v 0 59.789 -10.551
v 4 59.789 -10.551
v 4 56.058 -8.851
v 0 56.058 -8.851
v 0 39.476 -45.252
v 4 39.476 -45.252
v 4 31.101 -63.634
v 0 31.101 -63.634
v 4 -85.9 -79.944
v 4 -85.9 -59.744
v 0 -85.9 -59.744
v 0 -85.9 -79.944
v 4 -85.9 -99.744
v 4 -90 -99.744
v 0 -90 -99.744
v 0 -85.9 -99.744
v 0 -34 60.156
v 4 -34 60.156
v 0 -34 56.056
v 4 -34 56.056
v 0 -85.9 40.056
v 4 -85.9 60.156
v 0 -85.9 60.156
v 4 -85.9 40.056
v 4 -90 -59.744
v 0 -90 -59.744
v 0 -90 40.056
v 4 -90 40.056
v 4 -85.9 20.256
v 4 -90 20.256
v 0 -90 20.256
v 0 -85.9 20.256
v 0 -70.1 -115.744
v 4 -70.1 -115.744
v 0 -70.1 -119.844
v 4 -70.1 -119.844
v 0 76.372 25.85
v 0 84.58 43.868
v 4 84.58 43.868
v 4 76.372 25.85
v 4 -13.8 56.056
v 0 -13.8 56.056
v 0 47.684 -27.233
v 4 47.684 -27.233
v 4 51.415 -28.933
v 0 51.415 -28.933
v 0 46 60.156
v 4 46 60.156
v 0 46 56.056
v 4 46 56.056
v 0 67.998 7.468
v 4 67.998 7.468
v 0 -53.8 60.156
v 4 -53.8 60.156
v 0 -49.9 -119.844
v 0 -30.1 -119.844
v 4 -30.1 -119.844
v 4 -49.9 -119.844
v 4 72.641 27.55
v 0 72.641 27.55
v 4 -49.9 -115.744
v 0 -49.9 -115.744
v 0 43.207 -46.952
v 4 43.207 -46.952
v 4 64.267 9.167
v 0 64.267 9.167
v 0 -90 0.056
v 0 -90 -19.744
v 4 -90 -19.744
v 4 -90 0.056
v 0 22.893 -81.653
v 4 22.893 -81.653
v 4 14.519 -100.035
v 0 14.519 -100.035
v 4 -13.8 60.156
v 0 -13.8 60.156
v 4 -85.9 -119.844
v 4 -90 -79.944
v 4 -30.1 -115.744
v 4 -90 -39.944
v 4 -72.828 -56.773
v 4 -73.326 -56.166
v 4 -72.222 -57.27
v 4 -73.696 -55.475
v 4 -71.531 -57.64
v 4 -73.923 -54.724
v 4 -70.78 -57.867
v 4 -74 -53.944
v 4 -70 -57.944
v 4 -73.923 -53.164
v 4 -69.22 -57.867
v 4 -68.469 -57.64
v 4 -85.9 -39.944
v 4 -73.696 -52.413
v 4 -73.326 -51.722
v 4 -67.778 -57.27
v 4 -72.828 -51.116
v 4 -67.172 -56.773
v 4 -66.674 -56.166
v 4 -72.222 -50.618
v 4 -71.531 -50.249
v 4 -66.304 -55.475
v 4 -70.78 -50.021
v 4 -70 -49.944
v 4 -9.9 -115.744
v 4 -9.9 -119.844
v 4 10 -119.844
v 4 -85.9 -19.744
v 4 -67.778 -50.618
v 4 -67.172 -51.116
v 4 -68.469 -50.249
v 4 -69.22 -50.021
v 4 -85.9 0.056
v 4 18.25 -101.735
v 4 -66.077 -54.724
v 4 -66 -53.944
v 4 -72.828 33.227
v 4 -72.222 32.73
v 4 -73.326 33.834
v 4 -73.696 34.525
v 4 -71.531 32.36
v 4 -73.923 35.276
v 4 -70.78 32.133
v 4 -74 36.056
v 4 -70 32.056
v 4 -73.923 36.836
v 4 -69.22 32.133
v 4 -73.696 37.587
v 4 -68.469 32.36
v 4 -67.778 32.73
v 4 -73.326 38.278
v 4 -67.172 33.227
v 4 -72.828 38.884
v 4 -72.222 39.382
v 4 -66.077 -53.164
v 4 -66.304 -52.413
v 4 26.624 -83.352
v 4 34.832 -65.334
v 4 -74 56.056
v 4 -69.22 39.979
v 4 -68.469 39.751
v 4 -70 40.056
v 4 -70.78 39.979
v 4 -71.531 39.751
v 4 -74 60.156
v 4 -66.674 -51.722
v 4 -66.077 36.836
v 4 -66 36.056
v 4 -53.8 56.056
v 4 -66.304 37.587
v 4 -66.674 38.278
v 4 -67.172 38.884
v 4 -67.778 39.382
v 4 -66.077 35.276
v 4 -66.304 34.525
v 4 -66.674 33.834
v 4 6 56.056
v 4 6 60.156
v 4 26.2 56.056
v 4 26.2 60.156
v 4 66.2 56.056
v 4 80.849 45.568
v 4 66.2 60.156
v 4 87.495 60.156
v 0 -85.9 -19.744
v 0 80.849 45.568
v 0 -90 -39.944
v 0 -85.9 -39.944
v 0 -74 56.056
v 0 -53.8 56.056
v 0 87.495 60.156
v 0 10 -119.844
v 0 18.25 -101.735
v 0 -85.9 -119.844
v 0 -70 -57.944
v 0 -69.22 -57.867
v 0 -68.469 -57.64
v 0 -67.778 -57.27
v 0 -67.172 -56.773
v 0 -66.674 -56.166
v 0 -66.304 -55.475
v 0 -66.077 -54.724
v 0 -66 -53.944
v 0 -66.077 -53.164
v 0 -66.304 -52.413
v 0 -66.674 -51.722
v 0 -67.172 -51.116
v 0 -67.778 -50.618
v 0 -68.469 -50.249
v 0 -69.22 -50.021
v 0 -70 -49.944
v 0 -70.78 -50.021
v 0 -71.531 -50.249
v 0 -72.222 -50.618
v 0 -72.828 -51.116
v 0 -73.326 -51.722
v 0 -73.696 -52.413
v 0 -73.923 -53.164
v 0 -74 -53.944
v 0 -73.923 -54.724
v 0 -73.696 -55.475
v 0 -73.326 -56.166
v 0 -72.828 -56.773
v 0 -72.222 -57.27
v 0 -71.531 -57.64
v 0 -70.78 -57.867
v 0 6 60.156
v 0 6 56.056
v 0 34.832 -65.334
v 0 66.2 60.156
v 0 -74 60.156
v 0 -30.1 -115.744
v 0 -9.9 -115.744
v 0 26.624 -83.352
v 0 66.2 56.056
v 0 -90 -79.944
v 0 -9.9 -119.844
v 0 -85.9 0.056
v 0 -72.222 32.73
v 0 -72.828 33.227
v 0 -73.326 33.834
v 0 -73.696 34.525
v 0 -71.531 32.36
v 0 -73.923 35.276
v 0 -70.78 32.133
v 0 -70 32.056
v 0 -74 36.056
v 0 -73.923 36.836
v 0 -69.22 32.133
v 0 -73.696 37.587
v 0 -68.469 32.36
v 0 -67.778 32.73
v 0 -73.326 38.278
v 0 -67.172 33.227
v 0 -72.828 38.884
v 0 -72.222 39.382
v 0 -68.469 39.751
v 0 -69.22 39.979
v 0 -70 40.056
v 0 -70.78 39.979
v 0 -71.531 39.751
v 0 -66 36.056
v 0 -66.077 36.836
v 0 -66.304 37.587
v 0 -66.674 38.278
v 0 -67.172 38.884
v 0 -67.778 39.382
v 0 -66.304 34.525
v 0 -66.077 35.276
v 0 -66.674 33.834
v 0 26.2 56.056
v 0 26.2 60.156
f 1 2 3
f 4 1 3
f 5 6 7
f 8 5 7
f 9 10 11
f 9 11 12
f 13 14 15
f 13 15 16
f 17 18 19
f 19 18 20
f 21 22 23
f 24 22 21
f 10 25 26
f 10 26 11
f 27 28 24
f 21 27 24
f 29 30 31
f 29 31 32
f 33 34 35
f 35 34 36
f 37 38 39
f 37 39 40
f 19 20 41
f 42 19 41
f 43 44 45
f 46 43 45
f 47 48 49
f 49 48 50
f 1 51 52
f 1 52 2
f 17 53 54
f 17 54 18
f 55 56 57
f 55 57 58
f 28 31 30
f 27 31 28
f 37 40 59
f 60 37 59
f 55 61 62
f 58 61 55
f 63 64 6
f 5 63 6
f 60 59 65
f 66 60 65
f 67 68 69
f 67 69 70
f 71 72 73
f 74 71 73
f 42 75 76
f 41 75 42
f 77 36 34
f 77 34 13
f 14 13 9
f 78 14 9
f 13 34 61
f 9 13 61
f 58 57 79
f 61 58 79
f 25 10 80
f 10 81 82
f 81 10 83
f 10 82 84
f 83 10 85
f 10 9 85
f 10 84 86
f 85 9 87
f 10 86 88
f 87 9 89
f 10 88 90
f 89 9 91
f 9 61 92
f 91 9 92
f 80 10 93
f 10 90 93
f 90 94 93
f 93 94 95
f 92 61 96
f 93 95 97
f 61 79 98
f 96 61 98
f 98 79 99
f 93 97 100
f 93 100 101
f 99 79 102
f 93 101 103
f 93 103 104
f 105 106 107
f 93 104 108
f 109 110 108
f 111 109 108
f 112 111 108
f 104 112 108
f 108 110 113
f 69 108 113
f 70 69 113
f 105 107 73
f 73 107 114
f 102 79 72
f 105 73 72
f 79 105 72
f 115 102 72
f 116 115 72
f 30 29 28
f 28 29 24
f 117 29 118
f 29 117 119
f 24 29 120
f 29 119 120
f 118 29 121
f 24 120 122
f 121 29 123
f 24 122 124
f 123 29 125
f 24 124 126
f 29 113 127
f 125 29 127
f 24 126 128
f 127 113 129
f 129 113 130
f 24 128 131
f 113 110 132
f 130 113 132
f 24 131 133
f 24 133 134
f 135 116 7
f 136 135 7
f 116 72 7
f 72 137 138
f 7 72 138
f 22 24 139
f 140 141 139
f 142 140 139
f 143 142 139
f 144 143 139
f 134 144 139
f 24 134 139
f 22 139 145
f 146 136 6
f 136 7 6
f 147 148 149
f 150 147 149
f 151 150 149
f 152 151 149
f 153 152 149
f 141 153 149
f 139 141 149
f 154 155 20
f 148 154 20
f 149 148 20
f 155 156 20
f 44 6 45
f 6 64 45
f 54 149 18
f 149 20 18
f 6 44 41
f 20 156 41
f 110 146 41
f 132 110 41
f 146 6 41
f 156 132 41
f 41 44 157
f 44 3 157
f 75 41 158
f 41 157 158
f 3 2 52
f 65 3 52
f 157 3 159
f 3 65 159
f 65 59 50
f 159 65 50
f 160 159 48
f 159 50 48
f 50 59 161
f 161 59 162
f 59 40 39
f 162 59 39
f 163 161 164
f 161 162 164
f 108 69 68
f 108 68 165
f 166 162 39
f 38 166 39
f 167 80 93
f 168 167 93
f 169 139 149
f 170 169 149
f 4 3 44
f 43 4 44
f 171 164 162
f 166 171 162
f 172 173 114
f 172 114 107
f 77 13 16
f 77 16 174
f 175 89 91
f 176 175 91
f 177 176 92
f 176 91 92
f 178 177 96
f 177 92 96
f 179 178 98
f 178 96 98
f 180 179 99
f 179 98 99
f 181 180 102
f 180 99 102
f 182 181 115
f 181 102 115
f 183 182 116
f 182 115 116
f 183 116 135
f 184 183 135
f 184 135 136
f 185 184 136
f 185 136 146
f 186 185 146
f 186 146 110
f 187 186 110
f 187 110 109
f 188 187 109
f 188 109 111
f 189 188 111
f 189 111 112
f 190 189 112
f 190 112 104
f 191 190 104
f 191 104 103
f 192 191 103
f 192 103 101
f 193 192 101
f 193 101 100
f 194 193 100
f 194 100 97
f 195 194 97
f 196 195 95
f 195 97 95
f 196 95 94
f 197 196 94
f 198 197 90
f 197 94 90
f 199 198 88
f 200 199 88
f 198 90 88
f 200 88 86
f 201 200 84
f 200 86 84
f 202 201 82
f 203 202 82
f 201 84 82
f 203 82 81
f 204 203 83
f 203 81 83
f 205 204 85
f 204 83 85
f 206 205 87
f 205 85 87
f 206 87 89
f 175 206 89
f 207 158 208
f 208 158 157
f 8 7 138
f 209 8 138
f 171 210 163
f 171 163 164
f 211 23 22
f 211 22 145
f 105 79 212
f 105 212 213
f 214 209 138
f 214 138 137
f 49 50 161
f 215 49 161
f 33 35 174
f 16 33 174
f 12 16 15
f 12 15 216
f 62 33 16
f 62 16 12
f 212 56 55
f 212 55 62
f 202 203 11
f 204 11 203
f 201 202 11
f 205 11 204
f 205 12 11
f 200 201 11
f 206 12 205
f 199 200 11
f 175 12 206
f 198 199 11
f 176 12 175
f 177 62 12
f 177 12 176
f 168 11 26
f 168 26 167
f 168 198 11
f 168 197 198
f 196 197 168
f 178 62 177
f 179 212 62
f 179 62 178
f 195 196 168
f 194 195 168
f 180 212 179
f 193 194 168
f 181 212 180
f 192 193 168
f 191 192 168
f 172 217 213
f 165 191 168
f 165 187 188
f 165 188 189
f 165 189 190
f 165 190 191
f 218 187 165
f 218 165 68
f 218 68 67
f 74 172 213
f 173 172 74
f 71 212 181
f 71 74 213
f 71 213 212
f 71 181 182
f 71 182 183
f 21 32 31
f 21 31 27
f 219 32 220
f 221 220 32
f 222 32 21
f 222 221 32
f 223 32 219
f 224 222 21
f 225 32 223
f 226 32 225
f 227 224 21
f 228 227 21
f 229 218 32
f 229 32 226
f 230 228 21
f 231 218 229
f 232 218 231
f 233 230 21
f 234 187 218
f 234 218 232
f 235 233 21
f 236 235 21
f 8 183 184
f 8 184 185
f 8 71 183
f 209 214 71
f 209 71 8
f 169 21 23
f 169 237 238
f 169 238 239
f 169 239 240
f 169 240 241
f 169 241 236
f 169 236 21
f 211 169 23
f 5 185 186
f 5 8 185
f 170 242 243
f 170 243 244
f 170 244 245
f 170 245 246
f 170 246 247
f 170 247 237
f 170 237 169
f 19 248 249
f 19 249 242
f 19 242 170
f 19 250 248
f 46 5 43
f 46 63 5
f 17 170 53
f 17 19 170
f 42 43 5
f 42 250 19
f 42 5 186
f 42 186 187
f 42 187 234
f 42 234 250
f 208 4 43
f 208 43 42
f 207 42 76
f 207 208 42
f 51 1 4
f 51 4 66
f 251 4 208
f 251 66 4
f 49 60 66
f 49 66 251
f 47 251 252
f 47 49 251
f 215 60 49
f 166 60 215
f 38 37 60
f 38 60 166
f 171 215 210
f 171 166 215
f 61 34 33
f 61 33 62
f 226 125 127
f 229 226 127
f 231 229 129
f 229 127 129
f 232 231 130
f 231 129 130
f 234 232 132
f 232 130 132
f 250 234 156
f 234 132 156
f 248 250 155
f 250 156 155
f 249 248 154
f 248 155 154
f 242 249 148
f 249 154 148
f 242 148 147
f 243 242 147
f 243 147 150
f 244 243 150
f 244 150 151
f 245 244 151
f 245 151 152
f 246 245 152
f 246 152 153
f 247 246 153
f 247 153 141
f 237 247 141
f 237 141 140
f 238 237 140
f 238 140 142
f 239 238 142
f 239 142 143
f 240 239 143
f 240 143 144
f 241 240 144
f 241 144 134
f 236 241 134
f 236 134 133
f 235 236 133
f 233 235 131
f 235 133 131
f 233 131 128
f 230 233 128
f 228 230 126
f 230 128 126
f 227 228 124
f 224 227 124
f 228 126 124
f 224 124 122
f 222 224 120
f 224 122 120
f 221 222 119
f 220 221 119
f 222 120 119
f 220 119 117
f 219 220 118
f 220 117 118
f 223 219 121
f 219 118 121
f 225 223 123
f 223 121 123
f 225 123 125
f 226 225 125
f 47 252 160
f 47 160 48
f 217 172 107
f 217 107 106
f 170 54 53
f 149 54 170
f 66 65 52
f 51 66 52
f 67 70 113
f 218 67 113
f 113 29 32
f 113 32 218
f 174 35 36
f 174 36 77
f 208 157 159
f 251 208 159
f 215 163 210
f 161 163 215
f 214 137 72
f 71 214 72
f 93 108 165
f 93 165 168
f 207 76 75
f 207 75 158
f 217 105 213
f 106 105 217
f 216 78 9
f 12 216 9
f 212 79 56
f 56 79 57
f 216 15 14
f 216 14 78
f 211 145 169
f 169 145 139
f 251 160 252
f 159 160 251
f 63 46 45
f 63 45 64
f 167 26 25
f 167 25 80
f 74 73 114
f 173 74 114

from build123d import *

# Parameters (mm, degrees)
BOSS_EXTRUDE1_DEPTH = 4
SKETCH2_W           = 20.2
SKETCH2_H           = 4.1
CUT_EXTRUDE1_DEPTH  = 5
LPATTERN1_COUNT     = 6
LPATTERN1_PITCH     = 40
SKETCH3_W           = 4.1
SKETCH3_H           = 20.2
CUT_EXTRUDE2_DEPTH  = 4
LPATTERN2_COUNT     = 4
LPATTERN2_PITCH     = 40
SKETCH4_W           = 4.1
SKETCH4_H           = 20.2
CUT_EXTRUDE3_DEPTH  = 4
LPATTERN3_COUNT     = 2
LPATTERN3_PITCH     = 40
CUT_EXTRUDE4_DEPTH  = 4
LPATTERN4_COUNT     = 6
LPATTERN4_PITCH     = 40
SKETCH6_R           = 4
CUT_EXTRUDE5_DEPTH  = 5


with BuildPart() as part:
    # Sketch1 → Boss-Extrude1 (new body)
    with BuildSketch(Plane(origin=(0, 0, 0), x_dir=(0, 0, -1), z_dir=(1, 0, 0))):
        Polygon((-60.155879739, 92), (119.844120261, 10), (119.844120261, -90), (-60.155879739, -90), align=None)
    extrude(amount=BOSS_EXTRUDE1_DEPTH)

    # Sketch2 → Cut-Extrude1 (cut, through all)
    with BuildSketch(Plane(origin=(4, 0, 0), x_dir=(0, 0, -1), z_dir=(1, 0, 0))):
        with Locations((-50.155879739, -87.95)):
            Rectangle(SKETCH2_W, SKETCH2_H)
    cut_extrude1 = extrude(amount=-CUT_EXTRUDE1_DEPTH, mode=Mode.SUBTRACT)

    # LPattern1: Cut-Extrude1 ×6
    with Locations(*[(0, 0, -i * LPATTERN1_PITCH) for i in range(1, LPATTERN1_COUNT)]):
        add(cut_extrude1, mode=Mode.SUBTRACT)

    # Sketch3 → Cut-Extrude2 (cut)
    with BuildSketch(Plane(origin=(4, 0, 0), x_dir=(0, 0, -1), z_dir=(1, 0, 0))):
        with Locations((-58.105879739, -63.9)):
            Rectangle(SKETCH3_W, SKETCH3_H)
    cut_extrude2 = extrude(amount=-CUT_EXTRUDE2_DEPTH, mode=Mode.SUBTRACT)

    # LPattern2: Cut-Extrude2 ×4
    with Locations(*[(0, i * LPATTERN2_PITCH, 0) for i in range(1, LPATTERN2_COUNT)]):
        add(cut_extrude2, mode=Mode.SUBTRACT)

    # Sketch4 → Cut-Extrude3 (cut)
    with BuildSketch(Plane(origin=(4, 0, 0), x_dir=(0, 0, -1), z_dir=(1, 0, 0))):
        with Locations((117.794120261, -60)):
            Rectangle(SKETCH4_W, SKETCH4_H)
    cut_extrude3 = extrude(amount=-CUT_EXTRUDE3_DEPTH, mode=Mode.SUBTRACT)

    # LPattern3: Cut-Extrude3 ×2
    with Locations(*[(0, i * LPATTERN3_PITCH, 0) for i in range(1, LPATTERN3_COUNT)]):
        add(cut_extrude3, mode=Mode.SUBTRACT)

    # Sketch5 → Cut-Extrude4 (cut)
    with BuildSketch(Plane(origin=(4, 0, 0), x_dir=(0, 0, -1), z_dir=(1, 0, 0))):
        Polygon((101.734724645, 18.249835781), (83.352323065, 26.624040945), (81.652608155, 22.892959436), (100.035009735, 14.518754272), align=None)
    cut_extrude4 = extrude(amount=-CUT_EXTRUDE4_DEPTH, mode=Mode.SUBTRACT)

    # LPattern4: Cut-Extrude4 ×6
    with Locations(*[Vector(0, 0.414564612, 0.91001988) * (i * LPATTERN4_PITCH) for i in range(1, LPATTERN4_COUNT)]):
        add(cut_extrude4, mode=Mode.SUBTRACT)

    # Sketch6 → Cut-Extrude5 (cut, through all)
    with BuildSketch(Plane(origin=(4, 0, 0), x_dir=(0, 0, -1), z_dir=(1, 0, 0))):
        with Locations((-36.055879739, -70)):
            Circle(SKETCH6_R)
        with Locations((53.944120261, -70)):
            Circle(SKETCH6_R)
    extrude(amount=-CUT_EXTRUDE5_DEPTH, mode=Mode.SUBTRACT)


solid = part.part
